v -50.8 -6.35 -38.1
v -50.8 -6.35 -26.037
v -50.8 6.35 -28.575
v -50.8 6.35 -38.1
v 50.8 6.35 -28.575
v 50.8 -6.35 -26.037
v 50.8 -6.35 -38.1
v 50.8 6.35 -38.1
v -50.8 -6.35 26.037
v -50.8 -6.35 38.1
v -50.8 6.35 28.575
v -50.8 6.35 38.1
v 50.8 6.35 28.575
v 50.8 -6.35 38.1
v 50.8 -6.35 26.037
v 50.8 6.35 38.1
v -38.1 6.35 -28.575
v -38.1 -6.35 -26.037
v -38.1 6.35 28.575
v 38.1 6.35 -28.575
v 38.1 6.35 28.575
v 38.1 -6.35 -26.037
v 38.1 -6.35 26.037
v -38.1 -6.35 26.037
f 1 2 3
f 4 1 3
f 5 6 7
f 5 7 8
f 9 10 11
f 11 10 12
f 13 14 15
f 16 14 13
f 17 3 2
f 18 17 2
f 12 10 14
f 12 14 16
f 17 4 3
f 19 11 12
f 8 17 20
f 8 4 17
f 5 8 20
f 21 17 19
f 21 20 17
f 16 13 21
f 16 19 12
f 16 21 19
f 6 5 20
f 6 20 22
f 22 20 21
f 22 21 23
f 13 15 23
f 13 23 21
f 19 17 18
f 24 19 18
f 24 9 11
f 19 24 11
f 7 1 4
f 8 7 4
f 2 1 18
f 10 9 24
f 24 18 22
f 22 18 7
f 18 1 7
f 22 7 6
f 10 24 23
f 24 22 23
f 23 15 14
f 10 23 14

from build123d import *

# Parameters (mm, degrees)
F0_W     = 12.7
F0_H     = 76.2
F1_DEPTH = 50.8
F3_DEPTH = 12.7


# Not quite as in the source:
# - a pattern or mirror of a feature is missing from the dataset's text; its kind, count and spacing are read off the source's solid


with BuildPart() as f1:
    # F0 (on Right) → F1 (new body, symmetric)
    with BuildSketch(Plane.YZ):
        Rectangle(F0_W, F0_H)
    extrude(amount=F1_DEPTH, both=True)

    # F2 (on face) → F3 (cut)
    with BuildSketch(Plane(origin=(-50.8, 0, 0), x_dir=(0, -1, 0), z_dir=(-1, 0, 0))):
        Polygon((6.35, -26.0372895852), (6.35, 26.0372895852), (-6.35, 28.575), (-6.35, -28.575), align=None)
    f3 = extrude(amount=-F3_DEPTH, mode=Mode.SUBTRACT)

    # F3_copies: F3 across plane
    add(f3.mirror(Plane(origin=(0, 0, 0), x_dir=(0, 0, 1), z_dir=(1, 0, 0))), mode=Mode.SUBTRACT)


solid = f1.part
